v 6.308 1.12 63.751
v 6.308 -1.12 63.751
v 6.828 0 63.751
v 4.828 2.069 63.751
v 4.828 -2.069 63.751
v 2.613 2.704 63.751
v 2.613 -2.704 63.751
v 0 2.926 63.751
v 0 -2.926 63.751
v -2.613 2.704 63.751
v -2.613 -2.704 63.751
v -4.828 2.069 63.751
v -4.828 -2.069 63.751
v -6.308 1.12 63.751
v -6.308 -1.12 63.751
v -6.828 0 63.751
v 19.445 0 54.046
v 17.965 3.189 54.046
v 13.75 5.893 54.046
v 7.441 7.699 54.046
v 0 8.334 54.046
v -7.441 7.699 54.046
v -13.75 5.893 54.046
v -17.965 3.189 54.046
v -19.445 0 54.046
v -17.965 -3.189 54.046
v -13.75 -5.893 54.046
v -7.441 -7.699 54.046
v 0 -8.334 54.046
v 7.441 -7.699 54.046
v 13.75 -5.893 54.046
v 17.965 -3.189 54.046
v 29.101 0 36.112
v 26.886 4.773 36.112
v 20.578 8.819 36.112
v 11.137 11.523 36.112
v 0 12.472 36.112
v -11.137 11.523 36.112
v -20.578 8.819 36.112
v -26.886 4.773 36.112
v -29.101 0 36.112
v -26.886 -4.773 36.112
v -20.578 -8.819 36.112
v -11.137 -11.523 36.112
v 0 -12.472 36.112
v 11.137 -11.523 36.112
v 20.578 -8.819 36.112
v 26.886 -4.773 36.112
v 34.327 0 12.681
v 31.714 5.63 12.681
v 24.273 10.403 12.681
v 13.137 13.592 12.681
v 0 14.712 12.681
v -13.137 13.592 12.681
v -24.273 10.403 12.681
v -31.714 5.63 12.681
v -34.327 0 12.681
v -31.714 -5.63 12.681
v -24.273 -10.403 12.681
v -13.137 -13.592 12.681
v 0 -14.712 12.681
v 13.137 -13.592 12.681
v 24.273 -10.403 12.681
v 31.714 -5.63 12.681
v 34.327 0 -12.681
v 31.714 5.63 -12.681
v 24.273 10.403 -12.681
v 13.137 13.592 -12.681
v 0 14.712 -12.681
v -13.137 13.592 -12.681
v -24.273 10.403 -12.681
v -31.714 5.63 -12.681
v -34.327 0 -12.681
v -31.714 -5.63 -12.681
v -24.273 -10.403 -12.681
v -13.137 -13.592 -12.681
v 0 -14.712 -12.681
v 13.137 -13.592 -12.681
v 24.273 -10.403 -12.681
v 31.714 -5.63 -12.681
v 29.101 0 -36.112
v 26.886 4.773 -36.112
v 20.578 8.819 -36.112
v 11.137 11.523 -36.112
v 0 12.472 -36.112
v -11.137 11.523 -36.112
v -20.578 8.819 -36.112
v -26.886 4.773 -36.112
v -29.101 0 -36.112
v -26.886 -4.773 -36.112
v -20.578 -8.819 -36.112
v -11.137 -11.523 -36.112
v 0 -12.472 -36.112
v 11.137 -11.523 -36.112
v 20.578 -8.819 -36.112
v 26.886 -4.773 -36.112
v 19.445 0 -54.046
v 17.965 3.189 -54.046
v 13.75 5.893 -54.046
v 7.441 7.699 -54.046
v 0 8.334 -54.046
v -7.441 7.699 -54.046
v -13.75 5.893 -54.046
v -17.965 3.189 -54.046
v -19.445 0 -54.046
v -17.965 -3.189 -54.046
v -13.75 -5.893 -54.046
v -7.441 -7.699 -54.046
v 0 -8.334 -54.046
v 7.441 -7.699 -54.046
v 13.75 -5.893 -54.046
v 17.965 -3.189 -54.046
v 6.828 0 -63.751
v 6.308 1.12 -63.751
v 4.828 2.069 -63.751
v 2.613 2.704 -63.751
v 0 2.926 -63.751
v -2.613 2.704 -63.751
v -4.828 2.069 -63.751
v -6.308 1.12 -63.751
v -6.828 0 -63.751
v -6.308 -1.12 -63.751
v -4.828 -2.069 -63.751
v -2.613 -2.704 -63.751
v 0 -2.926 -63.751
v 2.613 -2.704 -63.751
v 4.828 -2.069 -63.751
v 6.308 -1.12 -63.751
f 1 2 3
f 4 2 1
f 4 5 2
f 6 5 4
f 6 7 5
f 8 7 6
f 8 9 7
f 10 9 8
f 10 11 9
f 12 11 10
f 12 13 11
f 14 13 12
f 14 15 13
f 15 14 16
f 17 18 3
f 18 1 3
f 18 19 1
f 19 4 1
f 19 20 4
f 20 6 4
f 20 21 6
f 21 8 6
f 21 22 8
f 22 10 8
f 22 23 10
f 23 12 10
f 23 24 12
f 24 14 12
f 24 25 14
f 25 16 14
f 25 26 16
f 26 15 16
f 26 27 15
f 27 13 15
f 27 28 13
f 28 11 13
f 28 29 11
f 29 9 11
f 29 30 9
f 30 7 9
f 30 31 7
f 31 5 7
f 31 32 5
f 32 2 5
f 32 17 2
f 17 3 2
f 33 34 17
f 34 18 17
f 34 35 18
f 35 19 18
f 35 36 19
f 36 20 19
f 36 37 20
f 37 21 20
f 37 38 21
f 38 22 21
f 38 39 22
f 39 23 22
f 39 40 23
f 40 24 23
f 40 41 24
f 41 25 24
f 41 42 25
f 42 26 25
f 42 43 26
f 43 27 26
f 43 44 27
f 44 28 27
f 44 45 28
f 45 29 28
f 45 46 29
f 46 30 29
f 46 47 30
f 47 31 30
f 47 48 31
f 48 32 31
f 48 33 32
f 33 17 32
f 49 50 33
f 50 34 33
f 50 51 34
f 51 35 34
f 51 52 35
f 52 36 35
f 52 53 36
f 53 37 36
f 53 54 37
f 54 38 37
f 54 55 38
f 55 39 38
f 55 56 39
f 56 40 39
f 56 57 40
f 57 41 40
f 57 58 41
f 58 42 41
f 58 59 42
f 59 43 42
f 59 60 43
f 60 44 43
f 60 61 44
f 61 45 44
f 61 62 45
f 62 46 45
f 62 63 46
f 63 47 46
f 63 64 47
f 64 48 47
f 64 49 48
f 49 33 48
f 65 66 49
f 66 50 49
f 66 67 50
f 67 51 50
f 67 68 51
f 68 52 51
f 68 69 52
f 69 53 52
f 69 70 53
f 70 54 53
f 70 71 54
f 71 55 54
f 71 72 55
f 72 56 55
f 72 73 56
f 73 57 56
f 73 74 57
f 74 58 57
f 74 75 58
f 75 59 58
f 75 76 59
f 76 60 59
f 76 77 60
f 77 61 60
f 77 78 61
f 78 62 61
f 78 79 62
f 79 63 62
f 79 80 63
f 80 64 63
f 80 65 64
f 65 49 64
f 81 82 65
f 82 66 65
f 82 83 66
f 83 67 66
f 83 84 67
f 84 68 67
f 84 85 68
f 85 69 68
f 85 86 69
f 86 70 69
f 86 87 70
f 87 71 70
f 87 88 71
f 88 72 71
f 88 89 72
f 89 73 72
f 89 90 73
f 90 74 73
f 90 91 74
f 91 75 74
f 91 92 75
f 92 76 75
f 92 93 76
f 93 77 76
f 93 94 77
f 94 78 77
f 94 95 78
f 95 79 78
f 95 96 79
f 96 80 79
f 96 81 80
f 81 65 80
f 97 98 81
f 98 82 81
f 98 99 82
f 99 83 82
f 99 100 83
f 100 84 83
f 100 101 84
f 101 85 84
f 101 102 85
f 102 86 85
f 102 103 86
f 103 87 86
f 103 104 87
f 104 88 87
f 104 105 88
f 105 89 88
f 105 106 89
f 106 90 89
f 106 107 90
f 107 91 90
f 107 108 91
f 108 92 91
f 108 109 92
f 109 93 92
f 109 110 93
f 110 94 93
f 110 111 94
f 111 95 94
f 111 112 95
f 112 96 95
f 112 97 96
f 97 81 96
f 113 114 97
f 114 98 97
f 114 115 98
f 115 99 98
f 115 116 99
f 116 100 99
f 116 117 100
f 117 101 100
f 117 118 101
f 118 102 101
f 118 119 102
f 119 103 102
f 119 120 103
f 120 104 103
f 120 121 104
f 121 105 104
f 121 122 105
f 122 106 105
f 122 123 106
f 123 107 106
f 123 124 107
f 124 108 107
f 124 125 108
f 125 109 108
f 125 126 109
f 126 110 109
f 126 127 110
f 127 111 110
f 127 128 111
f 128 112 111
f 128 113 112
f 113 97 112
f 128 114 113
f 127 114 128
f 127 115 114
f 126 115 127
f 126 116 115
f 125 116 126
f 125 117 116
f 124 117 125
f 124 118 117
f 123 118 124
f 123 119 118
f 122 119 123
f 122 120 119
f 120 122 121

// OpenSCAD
// Generated by SolidPython 1.0.1 on 2020-07-29 00:46:47


scale(v = [7, 3, 13]) {
	sphere(r = 5);
}
/***********************************************
*********      SolidPython code:      **********
************************************************
 
# import packages: SolidPython
from solid import *
from solid.utils import *
from itertools import chain, combinations, permutations


class Resize:

    def __init__(self, scad_file):
        self.scad_file = scad_file
        #self.scad_file = import_scad(scad_file)
        # cone/cylinder param:
        self.r1 = 0
        self.r2 = 0
        self.h = 0
        # rectangular prism param:
        self.w = 0
        self.l = 0
        # ellipse param:
        self.r = 0

    # import OpenScad code (file name corresponds to shape)


    # classify shape + parameters
    def assign(self, param1, param2, param3):
        if self.scad_file == 'cone.scad':
            self.r1 = param1
            self.r2 = param2
            self.h = param3
        elif self.scad_file == 'cylinder.scad':
            self.r1 = param1
            self.r2 = param2
            self.h = param3
        elif self.scad_file == 'rectangularPrism.scad':
            self.h = param1
            self.l = param2
            self.w = param3
        else:
            self.r = param1
            self.h = param2

    # resize parameters
    def iterate(self):
        x = range(3, 20, 2)
        i = 1
        if self.scad_file == 'cone.scad':
            tempList = list(permutations(x, 2))
            for temp in tempList:
                param1 = temp[0]
                param2 = temp[1]
                filepath = 'produced_scad_files/' + 'cone' + str(param1) + '_' + str(param2) + '_' + '.scad'
                scad_render_to_file(cylinder(h=param1, r1=param2, r2=0), filepath)

        elif self.scad_file == 'cylinder.scad':
            tempList = list(permutations(x, 3))
            for temp in tempList:
                param1 = temp[0]
                param2 = temp[1]
                filepath = 'produced_scad_files/' + 'cylinder' + str(param1) + '_' + str(param2) + '_' + '.scad'
                scad_render_to_file(cylinder(h=param1, r1=param2, r2=param2), filepath)

        elif self.scad_file == 'rectangularPrism.scad':
            tempList = list(permutations(x, 3))
            for temp in tempList:
                param1 = temp[0]
                param2 = temp[1]
                param3 = temp[2]
                filepath = 'produced_scad_files/' + 'rectangularPrism' + str(param1) + '_' + str(param2) + '_' + str(
                    param3) + '.scad'
                scad_render_to_file(cube(size=(param1, param2, param3)), filepath)

        elif self.scad_file == 'ellipse.scad':
            tempList = list(permutations(x, 4))
            for temp in tempList:
                param1 = temp[0]
                param2 = temp[1]
                param3 = temp[2]
                param4 = temp[3]
                filepath = 'produced_scad_files/' + 'ellipse' + str(param1) + '_' + str(param2) + '_' + str(param3) + '_' + str(param4) + '.scad'
                scad_render_to_file(scale([param1, param2, param3])(sphere(r=param4)), filepath)

    def render_to_scadfile(self):
        scad_render_to_file(scad, 'example.scad') 
 
************************************************/
